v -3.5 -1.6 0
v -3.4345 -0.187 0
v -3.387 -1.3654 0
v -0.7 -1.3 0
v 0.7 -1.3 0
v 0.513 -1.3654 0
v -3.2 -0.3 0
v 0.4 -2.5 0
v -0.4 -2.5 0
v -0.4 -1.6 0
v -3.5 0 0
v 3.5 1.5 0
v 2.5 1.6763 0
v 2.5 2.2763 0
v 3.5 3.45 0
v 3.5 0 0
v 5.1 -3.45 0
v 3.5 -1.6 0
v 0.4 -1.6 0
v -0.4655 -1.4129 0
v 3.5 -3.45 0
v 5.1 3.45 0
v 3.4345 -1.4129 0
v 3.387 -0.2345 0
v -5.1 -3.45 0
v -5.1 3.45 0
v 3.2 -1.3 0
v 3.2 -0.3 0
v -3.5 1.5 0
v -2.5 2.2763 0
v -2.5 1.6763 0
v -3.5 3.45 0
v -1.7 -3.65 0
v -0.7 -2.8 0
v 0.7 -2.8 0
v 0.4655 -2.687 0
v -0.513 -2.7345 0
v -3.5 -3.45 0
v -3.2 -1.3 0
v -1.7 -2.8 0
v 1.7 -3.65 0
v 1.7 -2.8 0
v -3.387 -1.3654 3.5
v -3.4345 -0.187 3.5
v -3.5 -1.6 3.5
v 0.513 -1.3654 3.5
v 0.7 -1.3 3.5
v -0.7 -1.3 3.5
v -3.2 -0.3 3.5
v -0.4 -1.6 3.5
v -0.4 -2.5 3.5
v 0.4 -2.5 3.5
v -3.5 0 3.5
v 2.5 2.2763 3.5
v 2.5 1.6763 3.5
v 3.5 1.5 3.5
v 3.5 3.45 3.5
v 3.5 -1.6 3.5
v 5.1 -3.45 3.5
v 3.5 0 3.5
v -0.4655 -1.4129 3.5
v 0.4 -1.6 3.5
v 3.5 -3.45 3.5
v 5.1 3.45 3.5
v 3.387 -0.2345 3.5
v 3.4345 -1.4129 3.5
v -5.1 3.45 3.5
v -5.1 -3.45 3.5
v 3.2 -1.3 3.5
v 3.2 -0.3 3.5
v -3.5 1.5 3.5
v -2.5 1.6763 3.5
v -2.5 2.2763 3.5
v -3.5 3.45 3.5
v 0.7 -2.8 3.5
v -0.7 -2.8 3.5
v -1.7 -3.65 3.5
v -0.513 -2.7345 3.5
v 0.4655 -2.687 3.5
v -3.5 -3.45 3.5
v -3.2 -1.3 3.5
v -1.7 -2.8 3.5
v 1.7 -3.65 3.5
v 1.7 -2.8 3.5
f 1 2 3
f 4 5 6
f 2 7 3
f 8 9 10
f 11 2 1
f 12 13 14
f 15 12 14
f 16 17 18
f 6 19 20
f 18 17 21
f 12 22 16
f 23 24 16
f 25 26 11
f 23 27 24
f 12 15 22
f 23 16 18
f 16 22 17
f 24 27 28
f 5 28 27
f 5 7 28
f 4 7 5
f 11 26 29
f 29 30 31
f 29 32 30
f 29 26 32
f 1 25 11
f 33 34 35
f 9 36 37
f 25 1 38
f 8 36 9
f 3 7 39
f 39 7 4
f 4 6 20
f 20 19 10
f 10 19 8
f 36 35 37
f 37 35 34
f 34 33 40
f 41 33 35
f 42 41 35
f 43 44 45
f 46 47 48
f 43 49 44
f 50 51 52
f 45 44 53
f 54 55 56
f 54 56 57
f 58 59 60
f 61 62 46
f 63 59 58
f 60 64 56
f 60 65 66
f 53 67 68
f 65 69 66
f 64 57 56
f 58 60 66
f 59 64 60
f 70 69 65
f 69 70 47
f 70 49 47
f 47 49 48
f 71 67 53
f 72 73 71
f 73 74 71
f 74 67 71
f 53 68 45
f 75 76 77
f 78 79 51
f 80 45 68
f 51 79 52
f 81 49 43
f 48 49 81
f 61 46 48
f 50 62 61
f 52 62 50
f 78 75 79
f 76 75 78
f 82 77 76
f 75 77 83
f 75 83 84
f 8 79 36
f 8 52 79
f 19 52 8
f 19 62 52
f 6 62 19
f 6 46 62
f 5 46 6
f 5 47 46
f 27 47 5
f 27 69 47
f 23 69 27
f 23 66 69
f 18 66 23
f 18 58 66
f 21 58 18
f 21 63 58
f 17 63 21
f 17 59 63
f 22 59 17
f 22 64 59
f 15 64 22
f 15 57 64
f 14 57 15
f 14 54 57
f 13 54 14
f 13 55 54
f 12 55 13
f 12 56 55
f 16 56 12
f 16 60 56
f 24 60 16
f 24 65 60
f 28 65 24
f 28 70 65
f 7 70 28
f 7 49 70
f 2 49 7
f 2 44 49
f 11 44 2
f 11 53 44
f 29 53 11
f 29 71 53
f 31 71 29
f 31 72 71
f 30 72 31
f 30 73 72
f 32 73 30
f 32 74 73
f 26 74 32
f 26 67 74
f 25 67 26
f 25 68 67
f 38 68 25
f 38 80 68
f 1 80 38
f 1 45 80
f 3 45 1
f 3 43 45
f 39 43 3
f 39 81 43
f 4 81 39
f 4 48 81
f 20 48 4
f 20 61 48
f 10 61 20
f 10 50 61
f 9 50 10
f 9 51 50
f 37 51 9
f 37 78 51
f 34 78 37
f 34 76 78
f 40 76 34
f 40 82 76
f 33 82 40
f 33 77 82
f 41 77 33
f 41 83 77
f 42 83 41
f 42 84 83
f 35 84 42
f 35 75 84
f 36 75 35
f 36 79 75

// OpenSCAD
// stem — what a charm is fixed to when the bracelet uses the U-pin mount.
//
// The H-pin's upper half — the same legs, crossbar and hooks — so it snaps
// into any charm's two holes. Its lower legs are plain stubs with no hooks,
// and a neck with a foot hangs from the crossbar's middle. The stem drops into
// a bar's pocket, and a U-pin (models/u-pin) slides in over the foot.
//
// ONE STEM PER CHARM. Snap the charm onto the stem FIRST, off the bracelet:
// its legs have to turn to let the hooks in, and in the bar they cannot. Once
// the stem is in a bar the charm is locked on it — the stub slots hug the legs,
// so they cannot turn to let it go. Lift the stem out and it comes off again,
// with the same effort as before.
//
// PRINT IT LYING FLAT, exactly as modelled — like the H-pin. In ABS: the
// crossbar bends ~6 % once, when the charm goes on.
//
// All the geometry and every number live in lib/charm-stem.scad.

$fa = 2;
$fs = 0.3;

include <../../lib/charm-stem.scad>

copies  = 1;      // how many to lay out; `-D copies=3` for a batch
spacing = 2*hp_uo + 3;

assert(copies >= 1, "copies must be at least 1");

echo(str("stem: ", 2*hp_uo, " x ", hp_v_top - hp_v_end, " x ", hp_t,
         " mm; neck ", st_neck, ", foot ", 2*st_foot, " x ", st_foot_h,
         "; crossbar ", 100*st_strain_up, "% as the charm goes on"));

for (i = [0 : copies - 1])
    translate([i * spacing, 0, 0]) linear_extrude(hp_t) st_stem_2d();
